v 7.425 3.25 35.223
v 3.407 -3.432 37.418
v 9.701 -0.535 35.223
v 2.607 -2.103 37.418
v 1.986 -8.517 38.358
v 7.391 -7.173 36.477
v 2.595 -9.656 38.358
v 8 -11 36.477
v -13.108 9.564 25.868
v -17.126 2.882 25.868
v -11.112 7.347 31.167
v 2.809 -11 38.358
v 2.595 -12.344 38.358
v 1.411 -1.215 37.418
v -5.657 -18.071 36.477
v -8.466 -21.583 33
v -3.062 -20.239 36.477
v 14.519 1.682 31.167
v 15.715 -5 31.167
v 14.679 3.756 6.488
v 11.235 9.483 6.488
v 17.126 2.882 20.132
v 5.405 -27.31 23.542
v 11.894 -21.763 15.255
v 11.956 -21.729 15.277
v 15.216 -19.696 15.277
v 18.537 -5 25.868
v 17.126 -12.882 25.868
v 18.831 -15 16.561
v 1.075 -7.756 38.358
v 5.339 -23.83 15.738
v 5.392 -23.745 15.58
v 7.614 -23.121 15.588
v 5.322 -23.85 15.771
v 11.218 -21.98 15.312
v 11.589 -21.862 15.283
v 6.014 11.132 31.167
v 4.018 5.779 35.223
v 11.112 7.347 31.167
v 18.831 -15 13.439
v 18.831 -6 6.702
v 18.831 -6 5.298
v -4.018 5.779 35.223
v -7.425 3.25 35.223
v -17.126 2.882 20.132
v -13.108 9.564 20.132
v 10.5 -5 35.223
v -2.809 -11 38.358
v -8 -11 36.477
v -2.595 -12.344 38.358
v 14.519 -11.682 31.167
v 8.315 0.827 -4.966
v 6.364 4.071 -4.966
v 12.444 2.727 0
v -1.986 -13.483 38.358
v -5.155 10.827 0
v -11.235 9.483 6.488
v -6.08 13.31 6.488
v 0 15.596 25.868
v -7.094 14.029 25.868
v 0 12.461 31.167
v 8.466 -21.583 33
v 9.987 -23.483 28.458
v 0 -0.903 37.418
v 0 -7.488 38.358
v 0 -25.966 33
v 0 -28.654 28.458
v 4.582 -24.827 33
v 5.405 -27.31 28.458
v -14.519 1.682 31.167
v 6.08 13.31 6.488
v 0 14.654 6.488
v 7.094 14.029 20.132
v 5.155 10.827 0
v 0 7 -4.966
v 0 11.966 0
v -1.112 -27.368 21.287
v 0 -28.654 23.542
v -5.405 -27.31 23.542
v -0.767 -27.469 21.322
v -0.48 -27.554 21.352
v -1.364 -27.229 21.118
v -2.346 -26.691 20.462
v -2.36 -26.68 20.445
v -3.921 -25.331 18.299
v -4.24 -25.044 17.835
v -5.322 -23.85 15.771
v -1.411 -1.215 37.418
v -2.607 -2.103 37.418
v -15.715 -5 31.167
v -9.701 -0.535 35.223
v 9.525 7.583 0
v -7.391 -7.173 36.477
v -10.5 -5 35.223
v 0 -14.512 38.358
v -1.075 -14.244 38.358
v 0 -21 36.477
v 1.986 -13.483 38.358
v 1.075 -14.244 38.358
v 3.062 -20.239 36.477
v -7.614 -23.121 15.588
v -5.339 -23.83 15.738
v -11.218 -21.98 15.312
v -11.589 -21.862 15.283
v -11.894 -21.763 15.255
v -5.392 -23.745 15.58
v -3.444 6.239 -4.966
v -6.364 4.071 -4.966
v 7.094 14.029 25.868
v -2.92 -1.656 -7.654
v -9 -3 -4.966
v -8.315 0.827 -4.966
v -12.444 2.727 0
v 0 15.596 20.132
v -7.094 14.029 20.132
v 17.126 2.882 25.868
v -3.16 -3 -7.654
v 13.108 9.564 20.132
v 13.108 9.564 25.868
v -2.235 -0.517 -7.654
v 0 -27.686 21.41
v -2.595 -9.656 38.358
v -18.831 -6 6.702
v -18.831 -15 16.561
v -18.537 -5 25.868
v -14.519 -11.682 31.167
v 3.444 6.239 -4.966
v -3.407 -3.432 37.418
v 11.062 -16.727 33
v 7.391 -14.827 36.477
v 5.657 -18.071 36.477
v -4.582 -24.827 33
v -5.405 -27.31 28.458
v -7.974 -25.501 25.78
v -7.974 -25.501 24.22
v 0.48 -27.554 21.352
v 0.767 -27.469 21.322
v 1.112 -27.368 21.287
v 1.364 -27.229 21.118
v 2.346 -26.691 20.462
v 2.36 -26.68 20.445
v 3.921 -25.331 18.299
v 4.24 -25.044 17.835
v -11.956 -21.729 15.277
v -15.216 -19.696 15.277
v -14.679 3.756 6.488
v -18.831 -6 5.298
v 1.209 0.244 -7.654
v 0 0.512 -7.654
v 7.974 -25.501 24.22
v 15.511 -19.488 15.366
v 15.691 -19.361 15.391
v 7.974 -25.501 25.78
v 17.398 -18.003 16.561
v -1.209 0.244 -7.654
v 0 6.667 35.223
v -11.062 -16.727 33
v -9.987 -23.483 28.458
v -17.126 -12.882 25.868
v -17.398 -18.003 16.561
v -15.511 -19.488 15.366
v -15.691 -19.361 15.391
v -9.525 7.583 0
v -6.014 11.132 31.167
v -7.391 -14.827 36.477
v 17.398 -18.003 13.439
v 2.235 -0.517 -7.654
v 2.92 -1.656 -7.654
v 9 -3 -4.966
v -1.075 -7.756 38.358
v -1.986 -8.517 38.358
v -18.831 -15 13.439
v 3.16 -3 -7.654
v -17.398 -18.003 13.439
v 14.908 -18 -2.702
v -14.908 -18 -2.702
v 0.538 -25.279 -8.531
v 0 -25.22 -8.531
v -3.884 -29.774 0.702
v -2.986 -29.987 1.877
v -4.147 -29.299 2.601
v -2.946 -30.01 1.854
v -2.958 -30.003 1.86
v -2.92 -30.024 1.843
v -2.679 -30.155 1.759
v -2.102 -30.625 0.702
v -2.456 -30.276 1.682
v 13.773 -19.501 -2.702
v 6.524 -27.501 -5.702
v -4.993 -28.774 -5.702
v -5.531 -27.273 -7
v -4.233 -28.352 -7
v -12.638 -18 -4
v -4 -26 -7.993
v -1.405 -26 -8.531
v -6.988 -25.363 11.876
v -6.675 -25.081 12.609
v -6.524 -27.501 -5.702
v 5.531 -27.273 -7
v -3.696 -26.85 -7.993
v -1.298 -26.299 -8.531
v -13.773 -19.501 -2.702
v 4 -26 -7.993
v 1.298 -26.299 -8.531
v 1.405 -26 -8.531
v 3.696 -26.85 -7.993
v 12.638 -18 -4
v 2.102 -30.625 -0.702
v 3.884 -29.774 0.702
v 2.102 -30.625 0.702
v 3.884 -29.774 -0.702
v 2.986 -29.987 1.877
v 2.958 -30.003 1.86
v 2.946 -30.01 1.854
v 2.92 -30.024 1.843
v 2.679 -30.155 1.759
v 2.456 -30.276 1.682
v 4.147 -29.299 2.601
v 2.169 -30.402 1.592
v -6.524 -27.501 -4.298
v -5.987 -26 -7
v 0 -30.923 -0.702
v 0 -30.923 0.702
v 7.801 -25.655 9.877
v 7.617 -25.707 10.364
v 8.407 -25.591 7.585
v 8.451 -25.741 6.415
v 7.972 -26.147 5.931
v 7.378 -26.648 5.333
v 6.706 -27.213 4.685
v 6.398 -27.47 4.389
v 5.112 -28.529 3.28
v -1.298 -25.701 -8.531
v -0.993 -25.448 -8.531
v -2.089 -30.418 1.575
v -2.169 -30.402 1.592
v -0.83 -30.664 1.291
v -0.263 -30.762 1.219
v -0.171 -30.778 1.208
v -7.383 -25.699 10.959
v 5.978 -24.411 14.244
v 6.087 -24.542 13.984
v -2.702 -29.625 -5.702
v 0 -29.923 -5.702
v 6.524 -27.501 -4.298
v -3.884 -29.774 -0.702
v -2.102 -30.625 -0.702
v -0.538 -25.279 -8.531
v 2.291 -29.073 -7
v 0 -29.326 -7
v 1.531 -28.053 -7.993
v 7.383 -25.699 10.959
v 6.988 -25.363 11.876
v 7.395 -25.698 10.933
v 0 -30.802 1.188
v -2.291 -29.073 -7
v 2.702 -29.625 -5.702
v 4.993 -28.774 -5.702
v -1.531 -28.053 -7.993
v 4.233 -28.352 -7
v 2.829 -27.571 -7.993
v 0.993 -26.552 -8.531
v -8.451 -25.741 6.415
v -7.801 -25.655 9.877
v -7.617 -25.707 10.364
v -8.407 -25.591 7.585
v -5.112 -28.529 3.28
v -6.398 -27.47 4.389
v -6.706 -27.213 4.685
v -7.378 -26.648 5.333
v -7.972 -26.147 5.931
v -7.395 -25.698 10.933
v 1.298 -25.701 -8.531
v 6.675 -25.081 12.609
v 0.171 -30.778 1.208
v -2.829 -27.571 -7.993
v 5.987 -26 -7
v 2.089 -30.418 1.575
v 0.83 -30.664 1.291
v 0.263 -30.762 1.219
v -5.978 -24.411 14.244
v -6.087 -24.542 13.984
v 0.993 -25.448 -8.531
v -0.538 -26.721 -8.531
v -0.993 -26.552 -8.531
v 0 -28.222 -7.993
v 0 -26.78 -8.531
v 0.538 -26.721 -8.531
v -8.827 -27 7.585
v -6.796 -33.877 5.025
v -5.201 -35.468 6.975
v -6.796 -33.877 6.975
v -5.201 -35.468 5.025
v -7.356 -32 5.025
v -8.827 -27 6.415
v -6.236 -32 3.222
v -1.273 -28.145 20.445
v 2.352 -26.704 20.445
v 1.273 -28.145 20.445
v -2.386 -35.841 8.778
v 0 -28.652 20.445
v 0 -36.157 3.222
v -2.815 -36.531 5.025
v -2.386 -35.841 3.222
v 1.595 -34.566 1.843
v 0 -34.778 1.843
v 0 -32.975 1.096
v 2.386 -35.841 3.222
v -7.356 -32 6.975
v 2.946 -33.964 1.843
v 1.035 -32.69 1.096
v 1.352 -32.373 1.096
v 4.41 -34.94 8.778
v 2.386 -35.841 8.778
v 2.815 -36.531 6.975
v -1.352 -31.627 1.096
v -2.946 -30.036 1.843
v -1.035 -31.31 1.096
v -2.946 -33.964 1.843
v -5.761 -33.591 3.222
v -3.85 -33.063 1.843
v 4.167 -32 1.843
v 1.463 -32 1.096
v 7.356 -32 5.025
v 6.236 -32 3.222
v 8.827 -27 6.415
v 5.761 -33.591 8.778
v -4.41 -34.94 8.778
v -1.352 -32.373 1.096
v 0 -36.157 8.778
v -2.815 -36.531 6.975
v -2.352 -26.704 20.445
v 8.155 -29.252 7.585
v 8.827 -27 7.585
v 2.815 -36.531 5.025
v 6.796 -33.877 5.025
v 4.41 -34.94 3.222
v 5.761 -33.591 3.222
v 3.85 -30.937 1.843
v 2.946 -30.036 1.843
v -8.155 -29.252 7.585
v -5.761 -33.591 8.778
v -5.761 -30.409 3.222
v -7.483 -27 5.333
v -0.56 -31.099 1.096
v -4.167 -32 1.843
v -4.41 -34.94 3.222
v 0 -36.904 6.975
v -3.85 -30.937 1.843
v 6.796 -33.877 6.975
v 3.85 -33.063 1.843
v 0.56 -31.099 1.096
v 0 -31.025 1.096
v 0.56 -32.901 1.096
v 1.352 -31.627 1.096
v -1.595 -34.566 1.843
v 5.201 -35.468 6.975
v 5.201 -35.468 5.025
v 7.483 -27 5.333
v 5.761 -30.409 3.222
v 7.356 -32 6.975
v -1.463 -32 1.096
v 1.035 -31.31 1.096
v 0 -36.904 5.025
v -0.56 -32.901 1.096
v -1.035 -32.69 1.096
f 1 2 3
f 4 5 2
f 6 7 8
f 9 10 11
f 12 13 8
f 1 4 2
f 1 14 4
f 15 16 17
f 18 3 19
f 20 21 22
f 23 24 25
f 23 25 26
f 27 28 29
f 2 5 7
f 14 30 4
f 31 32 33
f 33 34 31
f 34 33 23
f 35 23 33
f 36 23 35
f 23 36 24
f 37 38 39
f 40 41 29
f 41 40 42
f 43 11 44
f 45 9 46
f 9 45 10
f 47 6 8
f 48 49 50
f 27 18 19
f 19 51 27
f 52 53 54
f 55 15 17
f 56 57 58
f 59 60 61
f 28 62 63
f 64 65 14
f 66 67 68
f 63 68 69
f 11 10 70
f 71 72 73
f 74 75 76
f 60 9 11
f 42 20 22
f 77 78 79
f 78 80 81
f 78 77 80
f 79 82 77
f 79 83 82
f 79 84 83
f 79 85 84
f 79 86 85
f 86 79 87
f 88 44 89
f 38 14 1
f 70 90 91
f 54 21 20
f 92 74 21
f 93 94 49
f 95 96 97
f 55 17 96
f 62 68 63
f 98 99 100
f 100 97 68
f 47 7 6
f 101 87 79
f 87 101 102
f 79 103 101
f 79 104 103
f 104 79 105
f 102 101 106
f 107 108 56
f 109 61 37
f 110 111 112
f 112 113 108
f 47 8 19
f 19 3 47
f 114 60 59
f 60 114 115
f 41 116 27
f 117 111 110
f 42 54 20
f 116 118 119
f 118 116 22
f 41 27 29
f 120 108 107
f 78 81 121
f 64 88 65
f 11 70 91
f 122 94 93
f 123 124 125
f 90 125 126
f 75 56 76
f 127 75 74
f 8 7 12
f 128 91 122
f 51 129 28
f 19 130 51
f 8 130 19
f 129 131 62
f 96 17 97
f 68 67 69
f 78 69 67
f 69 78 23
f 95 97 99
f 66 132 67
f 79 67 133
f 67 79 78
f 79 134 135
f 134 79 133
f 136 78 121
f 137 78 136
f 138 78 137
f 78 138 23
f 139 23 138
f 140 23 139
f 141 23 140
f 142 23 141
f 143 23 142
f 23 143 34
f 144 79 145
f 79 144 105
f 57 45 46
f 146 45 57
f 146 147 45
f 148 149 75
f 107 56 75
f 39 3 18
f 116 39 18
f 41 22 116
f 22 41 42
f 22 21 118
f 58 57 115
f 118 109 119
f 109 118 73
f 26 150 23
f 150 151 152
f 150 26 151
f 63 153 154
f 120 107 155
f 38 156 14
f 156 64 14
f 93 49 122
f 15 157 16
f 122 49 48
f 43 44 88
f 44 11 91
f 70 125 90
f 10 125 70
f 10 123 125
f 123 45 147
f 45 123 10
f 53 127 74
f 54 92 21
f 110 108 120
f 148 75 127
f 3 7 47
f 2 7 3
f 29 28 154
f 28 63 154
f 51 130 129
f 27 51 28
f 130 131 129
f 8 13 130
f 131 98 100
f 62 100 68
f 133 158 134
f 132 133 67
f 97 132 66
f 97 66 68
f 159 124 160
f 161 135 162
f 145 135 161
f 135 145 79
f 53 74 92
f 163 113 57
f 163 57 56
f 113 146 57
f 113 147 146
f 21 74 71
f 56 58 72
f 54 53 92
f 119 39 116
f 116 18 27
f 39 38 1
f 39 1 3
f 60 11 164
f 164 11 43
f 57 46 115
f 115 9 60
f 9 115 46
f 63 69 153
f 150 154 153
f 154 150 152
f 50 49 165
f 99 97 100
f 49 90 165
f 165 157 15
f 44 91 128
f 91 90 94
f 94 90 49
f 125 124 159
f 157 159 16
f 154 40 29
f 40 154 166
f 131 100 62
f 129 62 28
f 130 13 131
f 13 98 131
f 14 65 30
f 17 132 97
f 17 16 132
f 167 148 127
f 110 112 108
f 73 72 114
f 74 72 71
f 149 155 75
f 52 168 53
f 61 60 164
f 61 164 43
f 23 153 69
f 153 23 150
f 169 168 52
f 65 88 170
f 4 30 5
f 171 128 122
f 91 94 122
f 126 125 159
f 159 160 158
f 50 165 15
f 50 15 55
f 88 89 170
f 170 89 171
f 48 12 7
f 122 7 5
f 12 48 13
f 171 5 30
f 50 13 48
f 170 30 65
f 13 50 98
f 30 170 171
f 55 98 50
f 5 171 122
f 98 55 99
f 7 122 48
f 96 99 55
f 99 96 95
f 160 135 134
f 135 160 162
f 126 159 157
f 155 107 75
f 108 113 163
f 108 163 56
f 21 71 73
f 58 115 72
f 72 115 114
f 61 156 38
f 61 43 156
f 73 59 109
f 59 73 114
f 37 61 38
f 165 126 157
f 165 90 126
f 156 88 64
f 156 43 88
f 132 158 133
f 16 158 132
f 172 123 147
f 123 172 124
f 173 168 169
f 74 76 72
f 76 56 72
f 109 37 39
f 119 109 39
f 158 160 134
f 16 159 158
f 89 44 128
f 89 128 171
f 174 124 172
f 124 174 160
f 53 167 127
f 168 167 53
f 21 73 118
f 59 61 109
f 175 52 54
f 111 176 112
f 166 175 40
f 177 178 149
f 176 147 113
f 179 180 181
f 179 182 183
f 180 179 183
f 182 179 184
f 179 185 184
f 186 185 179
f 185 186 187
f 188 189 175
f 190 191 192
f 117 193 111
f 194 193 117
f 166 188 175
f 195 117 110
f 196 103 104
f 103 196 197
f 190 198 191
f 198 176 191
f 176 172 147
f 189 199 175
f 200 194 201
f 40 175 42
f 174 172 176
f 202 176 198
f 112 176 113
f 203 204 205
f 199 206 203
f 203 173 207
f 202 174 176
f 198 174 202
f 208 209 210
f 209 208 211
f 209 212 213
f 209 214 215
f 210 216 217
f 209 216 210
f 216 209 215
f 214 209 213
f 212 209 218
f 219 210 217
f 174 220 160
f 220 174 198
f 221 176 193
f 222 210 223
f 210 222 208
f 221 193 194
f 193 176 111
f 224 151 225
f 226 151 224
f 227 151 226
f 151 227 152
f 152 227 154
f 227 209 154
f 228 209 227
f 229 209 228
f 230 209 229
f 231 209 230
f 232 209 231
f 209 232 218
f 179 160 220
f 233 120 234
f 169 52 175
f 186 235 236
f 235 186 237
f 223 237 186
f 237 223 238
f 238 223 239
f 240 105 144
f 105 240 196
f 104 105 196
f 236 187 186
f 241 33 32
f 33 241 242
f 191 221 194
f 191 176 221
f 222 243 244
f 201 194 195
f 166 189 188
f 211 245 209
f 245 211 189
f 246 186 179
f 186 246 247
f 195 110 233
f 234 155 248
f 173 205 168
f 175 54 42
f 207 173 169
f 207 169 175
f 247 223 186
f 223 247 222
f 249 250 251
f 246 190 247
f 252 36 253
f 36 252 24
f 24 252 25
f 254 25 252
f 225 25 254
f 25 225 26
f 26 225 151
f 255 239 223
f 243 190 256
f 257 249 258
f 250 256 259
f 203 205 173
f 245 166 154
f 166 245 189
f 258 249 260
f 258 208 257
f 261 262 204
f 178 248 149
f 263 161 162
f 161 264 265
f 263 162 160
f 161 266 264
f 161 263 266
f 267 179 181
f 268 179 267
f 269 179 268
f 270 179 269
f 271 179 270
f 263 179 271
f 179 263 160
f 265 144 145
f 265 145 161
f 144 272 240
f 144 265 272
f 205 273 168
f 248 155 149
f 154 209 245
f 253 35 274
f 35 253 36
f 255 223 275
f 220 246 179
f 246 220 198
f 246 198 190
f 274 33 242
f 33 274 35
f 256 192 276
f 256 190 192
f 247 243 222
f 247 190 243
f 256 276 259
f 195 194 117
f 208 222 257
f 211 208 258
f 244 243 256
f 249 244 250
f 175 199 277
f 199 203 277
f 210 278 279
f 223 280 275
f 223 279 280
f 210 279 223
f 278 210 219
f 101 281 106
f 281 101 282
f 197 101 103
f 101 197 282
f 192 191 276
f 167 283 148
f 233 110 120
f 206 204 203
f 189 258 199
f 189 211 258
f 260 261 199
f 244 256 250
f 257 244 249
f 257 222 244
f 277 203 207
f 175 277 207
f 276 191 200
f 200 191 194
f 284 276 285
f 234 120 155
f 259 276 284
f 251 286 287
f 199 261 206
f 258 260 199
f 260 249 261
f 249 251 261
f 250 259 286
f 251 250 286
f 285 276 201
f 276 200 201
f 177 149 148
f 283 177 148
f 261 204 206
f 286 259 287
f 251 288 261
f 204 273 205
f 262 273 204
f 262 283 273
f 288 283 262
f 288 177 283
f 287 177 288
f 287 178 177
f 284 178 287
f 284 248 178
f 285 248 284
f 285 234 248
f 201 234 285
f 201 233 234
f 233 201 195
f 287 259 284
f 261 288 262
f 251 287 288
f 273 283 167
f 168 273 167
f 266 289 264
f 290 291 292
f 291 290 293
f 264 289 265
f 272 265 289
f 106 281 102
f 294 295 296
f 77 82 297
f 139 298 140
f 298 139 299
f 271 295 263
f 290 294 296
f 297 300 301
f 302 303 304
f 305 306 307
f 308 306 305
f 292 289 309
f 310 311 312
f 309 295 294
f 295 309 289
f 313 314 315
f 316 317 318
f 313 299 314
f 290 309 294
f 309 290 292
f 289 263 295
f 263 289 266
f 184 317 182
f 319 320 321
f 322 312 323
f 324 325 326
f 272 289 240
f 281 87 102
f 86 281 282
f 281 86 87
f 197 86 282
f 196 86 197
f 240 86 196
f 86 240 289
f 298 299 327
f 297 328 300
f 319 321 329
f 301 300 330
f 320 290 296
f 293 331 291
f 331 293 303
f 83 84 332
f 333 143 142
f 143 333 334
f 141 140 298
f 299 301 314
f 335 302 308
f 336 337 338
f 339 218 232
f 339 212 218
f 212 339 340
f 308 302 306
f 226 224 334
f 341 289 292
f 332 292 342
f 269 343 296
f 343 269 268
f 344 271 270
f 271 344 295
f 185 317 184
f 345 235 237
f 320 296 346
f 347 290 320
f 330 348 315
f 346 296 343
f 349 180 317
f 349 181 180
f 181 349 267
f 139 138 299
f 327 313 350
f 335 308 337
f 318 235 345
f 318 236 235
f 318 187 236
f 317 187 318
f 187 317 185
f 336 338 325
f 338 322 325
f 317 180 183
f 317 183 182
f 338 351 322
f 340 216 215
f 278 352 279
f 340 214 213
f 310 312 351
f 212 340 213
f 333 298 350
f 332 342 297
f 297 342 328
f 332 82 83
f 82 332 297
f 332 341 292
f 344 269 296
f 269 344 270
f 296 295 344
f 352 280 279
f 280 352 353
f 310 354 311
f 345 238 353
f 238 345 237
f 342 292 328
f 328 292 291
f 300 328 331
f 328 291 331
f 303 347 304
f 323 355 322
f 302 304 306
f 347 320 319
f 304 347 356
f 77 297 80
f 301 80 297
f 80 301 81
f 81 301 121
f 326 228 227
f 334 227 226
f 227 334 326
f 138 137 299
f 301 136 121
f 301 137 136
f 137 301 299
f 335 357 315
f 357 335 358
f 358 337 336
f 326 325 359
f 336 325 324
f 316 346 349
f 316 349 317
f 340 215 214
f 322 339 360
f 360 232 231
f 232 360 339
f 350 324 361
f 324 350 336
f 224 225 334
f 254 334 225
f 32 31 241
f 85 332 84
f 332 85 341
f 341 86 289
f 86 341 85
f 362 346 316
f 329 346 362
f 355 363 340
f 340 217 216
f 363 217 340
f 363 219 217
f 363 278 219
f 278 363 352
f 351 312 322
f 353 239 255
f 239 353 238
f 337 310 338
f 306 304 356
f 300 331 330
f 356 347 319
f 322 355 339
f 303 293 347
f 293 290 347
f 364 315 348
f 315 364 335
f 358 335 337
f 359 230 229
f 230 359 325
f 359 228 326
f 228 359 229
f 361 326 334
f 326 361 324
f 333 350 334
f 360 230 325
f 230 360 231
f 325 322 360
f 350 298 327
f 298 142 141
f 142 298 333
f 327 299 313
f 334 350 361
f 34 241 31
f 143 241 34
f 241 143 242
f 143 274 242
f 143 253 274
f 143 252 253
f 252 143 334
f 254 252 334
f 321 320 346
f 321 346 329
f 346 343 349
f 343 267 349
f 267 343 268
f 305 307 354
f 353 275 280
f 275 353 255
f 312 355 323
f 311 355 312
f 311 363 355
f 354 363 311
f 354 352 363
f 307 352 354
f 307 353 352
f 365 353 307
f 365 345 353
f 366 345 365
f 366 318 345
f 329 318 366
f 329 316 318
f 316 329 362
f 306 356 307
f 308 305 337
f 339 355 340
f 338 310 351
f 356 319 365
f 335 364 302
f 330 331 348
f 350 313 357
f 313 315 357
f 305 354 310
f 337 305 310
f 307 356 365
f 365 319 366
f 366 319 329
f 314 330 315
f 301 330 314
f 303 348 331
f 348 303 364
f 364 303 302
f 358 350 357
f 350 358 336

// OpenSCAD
*translate([-0.9,0,0]) %import("dwarfhead.stl");

$fn=16;
 hull(){
translate([0,-5,23])scale([0.9,1,0.7])sphere(21);
translate([0,-11,26])scale([0.8,1,0.7])sphere(18);

*translate([0,-16,-3])scale([3.8,1,0.9])sphere(4);
translate([0,-6,6])scale([4.8,1,0.9])sphere(4);
translate([0,-3,10])scale([0.9,1,1])sphere(18);
//cheekbone
translate([0,-15,15])scale([4.8,2,2])sphere(4);
translate([0,-24,25])scale([2.2,1,1])sphere(4);
}
//jawline
 hull(){
translate([0,-26,-5])scale([1.8,1,0.9])sphere(4);
translate([0,-18,-2])scale([3.8,1,0.9])sphere(4);
translate([0,-6,6])scale([4.8,1,0.9])sphere(4);
translate([0,-3,10])scale([0.9,1,1])sphere(18);
//cheekbone
translate([0,-15,15])scale([4.8,2,2])sphere(4);
translate([0,-25,8])scale([1.8,1,0.9])sphere(4);
translate([0,-27,-0])scale([1.4,1,0.9])sphere(4);


}
//nose
hull(){
translate([0,-22,16])scale([0.5,1,1])sphere(8);

translate([0,-32,6])scale([1.5,1,1])sphere(5);
translate([0,-28,7])scale([0.5,1,1])sphere(4);
translate([0,-27,7])scale([3,2,1])sphere(3);
translate([0,-29,16])scale([1,1,1])sphere(2);
}
